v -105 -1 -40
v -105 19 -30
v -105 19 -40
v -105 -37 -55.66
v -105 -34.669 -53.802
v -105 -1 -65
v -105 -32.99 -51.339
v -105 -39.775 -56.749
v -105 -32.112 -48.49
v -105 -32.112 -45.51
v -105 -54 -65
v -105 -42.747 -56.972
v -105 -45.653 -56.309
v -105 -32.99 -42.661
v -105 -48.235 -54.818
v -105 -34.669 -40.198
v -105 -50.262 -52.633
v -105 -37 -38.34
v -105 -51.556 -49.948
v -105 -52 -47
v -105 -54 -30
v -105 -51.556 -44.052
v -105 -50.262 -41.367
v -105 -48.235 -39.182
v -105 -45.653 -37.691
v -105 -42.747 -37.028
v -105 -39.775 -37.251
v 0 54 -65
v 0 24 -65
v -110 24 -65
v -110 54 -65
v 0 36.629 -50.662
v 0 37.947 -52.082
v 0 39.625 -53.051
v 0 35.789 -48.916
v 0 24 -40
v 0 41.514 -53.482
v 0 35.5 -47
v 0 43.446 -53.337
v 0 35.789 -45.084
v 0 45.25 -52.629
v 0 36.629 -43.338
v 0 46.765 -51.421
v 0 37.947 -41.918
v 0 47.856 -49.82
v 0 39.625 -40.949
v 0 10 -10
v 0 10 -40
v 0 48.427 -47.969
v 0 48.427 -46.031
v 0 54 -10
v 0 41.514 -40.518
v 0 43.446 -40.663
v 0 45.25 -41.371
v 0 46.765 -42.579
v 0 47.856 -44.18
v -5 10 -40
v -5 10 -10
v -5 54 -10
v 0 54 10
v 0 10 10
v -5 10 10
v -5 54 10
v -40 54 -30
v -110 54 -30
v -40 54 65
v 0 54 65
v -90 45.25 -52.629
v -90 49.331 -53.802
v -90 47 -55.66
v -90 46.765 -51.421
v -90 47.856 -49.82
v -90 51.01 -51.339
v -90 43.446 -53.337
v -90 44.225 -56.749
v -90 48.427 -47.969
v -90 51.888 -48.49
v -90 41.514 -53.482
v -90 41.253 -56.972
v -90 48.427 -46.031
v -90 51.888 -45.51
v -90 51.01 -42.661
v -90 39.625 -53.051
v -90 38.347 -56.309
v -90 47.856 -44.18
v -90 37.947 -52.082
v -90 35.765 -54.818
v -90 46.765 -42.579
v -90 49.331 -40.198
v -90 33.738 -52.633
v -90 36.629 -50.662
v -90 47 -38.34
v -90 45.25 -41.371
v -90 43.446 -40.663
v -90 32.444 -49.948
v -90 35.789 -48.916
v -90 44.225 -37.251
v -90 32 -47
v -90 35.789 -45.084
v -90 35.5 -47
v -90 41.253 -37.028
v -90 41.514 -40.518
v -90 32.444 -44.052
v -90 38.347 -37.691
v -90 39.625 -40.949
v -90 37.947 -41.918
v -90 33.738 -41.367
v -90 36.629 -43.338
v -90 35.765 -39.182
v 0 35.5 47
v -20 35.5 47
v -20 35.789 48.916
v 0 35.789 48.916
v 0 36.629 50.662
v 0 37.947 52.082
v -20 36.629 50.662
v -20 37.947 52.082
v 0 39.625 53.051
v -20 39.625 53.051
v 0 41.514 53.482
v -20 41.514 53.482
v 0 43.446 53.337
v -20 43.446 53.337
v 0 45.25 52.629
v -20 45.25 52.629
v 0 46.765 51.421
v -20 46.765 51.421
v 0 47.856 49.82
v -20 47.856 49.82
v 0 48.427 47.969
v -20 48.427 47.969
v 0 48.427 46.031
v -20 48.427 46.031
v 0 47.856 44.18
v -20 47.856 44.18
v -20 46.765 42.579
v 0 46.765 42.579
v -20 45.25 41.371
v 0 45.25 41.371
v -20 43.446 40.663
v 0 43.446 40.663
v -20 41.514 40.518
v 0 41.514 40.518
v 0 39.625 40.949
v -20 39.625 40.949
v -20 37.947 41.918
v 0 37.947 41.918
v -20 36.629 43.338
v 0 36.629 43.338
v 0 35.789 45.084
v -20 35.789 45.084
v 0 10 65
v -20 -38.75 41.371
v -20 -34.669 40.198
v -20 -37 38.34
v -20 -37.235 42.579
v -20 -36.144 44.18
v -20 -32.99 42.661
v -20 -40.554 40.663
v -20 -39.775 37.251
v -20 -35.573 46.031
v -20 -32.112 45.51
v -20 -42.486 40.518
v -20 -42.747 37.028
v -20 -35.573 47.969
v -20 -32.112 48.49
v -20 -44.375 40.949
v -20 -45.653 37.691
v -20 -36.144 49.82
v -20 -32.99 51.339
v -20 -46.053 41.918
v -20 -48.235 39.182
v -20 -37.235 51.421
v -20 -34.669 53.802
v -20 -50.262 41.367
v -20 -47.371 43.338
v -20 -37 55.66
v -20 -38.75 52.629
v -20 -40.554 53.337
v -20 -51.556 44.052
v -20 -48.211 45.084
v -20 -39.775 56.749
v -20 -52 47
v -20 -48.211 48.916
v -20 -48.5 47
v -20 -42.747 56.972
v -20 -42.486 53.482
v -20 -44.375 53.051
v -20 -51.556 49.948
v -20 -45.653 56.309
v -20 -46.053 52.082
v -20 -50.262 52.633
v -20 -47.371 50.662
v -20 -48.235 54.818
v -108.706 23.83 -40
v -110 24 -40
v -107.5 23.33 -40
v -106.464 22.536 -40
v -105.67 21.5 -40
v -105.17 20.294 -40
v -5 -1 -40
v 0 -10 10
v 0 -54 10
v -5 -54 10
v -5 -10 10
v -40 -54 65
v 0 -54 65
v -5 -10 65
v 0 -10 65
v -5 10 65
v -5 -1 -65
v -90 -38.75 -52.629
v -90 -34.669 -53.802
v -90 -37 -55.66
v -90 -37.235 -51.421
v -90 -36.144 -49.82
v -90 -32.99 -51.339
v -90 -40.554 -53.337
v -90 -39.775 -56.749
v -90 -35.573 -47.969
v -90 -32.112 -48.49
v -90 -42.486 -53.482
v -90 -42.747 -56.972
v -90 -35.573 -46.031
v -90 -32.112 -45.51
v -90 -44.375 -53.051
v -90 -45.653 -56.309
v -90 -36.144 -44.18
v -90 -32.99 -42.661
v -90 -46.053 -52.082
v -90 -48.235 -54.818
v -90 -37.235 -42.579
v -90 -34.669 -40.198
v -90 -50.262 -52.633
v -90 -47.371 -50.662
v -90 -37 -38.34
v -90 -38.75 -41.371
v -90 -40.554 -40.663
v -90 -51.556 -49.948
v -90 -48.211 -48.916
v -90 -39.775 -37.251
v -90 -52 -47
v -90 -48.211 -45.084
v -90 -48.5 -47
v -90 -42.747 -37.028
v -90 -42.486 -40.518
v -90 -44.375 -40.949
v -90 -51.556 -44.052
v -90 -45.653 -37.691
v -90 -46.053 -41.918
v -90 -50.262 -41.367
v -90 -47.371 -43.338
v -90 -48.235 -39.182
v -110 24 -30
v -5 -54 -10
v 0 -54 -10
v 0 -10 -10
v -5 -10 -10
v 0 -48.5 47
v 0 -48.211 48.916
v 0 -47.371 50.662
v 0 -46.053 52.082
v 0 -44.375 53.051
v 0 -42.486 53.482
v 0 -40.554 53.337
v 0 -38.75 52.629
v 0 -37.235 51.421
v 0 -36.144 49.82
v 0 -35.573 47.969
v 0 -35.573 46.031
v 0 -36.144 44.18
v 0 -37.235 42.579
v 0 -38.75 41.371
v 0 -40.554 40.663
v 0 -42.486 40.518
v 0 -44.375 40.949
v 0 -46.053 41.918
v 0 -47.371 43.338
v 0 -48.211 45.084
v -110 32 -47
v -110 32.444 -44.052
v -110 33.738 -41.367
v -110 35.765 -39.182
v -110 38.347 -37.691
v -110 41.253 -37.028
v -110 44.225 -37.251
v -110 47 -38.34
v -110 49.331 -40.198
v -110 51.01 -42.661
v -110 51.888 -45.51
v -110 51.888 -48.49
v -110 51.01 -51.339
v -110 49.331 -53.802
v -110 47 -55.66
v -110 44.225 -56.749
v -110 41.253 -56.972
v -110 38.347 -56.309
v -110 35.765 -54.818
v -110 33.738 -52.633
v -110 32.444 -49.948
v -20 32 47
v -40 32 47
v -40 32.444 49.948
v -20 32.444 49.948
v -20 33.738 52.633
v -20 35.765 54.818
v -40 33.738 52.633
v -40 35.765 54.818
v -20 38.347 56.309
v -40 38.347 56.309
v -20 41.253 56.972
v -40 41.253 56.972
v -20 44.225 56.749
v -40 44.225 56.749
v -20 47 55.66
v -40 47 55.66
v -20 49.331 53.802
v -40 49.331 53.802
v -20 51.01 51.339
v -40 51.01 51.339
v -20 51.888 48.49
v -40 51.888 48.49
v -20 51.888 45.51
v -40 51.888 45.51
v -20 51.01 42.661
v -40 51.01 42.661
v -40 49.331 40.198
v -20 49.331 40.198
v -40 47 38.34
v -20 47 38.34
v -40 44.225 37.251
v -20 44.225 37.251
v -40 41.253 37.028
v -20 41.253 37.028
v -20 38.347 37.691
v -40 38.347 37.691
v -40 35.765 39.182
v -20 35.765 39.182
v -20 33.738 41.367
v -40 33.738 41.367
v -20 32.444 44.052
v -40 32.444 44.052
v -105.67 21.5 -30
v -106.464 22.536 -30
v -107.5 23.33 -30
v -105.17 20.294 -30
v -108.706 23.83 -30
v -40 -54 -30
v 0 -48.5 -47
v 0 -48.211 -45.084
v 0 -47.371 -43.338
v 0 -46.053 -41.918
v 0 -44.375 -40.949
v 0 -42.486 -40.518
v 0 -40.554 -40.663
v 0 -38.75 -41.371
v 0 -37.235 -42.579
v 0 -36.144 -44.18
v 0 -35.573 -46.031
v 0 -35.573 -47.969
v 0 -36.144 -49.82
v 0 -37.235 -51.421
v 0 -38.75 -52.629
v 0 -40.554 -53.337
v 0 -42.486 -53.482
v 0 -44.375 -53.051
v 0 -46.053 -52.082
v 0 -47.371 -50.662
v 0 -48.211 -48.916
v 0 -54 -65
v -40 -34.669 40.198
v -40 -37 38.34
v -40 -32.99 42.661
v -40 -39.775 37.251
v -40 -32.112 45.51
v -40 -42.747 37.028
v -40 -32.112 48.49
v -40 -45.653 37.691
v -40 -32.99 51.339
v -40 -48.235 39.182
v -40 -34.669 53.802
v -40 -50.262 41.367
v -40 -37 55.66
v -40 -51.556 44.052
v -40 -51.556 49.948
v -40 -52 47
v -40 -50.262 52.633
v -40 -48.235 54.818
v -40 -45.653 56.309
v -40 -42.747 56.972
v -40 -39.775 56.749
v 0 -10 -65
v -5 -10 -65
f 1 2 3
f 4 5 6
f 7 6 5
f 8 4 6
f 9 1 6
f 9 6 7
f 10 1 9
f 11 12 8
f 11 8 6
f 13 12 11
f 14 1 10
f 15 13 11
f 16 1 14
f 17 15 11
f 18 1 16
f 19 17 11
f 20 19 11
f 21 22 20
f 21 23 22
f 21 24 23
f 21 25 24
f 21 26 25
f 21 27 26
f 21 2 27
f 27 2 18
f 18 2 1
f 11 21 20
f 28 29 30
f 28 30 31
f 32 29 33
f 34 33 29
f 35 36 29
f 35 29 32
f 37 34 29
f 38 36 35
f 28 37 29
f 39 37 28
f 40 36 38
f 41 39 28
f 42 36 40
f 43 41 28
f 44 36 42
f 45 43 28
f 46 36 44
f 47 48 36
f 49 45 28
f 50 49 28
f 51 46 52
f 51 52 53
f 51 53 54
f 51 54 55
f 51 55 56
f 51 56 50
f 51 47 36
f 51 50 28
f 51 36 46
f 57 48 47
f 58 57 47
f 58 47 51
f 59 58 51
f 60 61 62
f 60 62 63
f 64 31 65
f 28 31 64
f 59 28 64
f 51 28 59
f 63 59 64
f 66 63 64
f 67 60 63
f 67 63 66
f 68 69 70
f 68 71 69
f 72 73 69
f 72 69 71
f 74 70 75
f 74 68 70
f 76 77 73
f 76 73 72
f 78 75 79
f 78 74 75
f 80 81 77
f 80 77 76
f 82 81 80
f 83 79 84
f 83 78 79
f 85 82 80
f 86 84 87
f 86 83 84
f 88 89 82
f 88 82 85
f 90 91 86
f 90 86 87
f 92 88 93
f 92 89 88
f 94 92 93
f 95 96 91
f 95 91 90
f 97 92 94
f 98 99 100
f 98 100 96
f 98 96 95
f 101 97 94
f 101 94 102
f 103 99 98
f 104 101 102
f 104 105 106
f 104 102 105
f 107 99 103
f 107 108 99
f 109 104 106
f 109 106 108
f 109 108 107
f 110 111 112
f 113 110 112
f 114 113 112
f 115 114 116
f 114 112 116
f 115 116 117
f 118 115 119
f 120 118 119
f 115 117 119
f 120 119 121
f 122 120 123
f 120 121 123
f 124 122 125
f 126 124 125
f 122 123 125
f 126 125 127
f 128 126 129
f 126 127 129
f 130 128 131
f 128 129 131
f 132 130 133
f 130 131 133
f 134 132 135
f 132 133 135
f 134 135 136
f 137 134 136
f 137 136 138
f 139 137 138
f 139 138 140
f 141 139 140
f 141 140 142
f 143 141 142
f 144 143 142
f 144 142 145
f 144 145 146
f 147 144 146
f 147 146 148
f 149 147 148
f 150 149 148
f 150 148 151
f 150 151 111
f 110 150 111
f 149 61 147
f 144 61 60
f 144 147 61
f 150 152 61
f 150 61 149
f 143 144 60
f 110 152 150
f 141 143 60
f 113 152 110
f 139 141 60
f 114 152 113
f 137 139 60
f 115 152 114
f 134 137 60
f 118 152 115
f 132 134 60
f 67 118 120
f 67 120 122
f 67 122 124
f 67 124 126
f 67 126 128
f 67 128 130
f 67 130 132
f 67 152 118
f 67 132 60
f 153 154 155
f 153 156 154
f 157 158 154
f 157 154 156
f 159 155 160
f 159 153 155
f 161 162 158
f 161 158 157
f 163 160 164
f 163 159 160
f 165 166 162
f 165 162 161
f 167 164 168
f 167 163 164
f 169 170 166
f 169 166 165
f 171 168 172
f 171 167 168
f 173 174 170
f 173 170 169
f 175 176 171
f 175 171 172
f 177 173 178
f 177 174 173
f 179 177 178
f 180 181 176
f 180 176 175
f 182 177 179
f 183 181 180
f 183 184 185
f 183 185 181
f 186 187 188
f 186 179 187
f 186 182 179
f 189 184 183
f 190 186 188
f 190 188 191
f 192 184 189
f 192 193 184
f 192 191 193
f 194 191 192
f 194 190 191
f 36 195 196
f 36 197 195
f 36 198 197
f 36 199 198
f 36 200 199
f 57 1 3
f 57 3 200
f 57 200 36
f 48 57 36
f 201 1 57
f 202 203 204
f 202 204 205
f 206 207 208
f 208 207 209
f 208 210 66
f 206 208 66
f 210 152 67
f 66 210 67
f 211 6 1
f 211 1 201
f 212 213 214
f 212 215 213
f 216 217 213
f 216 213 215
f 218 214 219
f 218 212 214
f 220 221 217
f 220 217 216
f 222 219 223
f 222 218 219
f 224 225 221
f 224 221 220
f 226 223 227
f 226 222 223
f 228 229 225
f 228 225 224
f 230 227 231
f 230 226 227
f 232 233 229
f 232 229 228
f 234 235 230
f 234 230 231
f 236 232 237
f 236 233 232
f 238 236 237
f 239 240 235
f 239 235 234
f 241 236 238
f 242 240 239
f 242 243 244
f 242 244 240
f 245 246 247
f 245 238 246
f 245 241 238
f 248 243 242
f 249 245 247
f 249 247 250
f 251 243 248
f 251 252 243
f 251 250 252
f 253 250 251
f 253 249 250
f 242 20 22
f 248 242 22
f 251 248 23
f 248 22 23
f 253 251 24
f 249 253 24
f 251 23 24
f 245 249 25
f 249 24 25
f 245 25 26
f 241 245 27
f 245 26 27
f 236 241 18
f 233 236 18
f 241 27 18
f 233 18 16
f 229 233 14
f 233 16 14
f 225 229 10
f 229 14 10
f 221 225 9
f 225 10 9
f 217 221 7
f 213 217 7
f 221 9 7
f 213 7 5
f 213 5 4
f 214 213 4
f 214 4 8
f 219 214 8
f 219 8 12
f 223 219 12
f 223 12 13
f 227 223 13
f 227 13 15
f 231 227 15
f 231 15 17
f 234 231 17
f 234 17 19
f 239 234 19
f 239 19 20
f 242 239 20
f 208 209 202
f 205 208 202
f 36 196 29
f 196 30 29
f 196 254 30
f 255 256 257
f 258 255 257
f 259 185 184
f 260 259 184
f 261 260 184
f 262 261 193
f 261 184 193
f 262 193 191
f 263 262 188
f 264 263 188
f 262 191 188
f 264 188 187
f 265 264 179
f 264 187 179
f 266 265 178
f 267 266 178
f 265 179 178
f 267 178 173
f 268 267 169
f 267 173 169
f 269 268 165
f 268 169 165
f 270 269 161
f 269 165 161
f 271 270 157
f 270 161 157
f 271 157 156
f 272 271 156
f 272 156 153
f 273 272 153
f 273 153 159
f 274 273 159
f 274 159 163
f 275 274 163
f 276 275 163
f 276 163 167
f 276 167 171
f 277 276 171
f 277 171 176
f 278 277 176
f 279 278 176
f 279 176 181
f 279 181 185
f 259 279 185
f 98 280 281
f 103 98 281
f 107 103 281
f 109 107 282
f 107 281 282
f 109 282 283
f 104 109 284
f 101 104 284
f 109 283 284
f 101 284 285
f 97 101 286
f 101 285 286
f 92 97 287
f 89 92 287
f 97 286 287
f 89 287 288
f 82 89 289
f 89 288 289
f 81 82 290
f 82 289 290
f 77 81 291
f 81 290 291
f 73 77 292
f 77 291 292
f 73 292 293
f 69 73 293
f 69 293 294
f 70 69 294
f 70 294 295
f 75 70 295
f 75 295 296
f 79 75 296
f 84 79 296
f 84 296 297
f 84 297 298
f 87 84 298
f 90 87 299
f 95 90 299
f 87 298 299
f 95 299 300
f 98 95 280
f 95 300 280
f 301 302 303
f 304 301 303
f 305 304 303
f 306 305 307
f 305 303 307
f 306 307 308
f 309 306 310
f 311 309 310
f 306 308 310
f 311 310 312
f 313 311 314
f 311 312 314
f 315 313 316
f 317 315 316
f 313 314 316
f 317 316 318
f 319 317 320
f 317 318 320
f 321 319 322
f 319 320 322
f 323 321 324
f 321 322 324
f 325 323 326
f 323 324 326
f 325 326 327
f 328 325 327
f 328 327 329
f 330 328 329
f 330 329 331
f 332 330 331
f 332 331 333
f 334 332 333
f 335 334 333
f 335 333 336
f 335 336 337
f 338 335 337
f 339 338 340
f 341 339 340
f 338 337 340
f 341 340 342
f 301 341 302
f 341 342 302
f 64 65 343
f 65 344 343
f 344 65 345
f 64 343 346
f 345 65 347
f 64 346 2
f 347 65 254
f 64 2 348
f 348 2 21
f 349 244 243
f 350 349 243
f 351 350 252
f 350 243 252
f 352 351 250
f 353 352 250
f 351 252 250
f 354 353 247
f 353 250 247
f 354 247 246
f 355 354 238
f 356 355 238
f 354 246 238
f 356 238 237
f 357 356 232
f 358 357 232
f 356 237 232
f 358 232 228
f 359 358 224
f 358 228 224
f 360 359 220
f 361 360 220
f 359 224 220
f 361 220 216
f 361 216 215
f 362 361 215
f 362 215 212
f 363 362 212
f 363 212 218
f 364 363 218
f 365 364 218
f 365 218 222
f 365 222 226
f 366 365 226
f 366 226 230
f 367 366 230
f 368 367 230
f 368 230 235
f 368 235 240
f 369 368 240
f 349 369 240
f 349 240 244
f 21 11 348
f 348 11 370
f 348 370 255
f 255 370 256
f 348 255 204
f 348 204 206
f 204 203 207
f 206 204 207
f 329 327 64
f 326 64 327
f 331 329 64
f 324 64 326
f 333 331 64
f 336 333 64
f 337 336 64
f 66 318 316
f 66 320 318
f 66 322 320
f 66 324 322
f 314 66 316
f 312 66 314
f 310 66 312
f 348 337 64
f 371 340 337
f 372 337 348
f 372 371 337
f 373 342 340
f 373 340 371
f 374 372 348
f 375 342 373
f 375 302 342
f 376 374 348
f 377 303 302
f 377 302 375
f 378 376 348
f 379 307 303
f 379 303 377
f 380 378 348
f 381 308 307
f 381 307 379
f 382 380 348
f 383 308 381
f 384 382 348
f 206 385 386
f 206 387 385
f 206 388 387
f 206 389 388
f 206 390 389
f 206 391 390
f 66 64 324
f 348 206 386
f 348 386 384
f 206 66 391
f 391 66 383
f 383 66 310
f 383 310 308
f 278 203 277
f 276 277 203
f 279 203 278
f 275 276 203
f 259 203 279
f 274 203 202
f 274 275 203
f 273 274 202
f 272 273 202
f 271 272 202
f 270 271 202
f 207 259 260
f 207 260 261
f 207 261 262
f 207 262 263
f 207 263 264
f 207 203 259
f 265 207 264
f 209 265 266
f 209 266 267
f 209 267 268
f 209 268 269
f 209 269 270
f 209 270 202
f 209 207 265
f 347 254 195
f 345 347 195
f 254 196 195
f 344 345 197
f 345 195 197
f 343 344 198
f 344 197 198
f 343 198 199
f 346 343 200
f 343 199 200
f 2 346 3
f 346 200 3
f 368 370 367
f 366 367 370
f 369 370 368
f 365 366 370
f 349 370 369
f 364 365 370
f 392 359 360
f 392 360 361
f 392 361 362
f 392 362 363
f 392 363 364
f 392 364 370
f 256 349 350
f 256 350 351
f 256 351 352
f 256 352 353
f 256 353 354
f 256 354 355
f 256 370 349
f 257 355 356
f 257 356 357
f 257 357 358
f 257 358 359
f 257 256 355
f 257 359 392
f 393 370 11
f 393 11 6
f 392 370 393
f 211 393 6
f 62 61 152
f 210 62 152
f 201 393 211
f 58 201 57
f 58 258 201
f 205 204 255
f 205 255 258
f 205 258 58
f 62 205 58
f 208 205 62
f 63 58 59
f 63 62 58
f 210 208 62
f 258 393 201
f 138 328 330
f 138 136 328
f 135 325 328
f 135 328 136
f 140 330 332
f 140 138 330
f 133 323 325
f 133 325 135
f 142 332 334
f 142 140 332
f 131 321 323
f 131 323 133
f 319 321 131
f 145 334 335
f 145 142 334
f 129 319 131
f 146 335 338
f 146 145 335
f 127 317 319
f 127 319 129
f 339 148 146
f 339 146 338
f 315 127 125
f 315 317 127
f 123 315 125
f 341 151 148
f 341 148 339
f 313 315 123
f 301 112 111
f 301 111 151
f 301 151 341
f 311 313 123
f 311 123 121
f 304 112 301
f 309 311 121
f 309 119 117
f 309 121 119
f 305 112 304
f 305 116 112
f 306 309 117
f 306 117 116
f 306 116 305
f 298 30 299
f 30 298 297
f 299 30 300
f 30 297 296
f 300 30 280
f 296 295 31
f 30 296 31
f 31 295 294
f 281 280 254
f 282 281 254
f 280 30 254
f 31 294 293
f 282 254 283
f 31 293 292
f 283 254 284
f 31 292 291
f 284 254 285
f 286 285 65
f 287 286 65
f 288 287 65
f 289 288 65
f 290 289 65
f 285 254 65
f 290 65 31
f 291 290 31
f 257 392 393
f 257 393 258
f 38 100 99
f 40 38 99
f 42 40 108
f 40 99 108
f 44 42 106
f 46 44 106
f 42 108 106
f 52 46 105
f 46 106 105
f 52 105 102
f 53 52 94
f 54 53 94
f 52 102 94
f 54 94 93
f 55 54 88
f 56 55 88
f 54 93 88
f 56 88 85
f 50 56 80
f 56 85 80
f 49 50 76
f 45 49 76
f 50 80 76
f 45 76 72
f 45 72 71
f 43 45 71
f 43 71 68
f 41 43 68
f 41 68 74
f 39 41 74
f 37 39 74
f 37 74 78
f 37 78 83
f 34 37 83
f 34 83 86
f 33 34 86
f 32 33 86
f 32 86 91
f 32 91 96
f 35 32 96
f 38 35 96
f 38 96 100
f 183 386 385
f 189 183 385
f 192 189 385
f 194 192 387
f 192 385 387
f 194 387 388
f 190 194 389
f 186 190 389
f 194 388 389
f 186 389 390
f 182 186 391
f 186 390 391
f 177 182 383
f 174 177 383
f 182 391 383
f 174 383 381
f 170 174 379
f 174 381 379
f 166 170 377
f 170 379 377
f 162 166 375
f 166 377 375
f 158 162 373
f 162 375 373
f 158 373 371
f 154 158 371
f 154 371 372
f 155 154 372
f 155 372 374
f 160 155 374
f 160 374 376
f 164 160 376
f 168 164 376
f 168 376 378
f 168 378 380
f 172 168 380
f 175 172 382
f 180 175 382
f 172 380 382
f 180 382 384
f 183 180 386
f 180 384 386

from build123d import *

# Parameters (mm, degrees)
F0_W      = 108
F0_H      = 130
F1_DEPTH  = 110
F2_R      = 6.5
F3_DEPTH  = 110.001
F4_W      = 108
F4_H      = 95
F5_DEPTH  = 70
F6_W      = 110
F6_H      = 25
F7_DEPTH  = 25
F8_R      = 6.5
F9_DEPTH  = 5
F10_R     = 4.99999
F11_R     = 10
F12_DEPTH = 20
F13_R     = 10
F14_DEPTH = 20
F15_W     = 20
F15_H     = 55
F15_W_2   = 44
F15_H_2   = 20
F16_DEPTH = 5


# Not quite as in the source:
# - a fillet or chamfer is up to 0.001 mm smaller than in the source, because OpenCascade refuses the exact size


with BuildPart() as f1:
    # F0 (on Right) → F1 (new body)
    with BuildSketch(Plane.YZ):
        Rectangle(F0_W, F0_H)
    extrude(amount=-F1_DEPTH)

    # F2 (on face) → F3 (cut, through all)
    with BuildSketch(Plane(origin=(-110, 0, 0), x_dir=(0, -1, 0), z_dir=(-1, 0, 0))):
        with Locations((-42, 47)):
            Circle(F2_R)
        with Locations((42, 47)):
            Circle(F2_R)
        with Locations((-42, -47)):
            Circle(F2_R)
        with Locations((42, -47)):
            Circle(F2_R)
    extrude(amount=-F3_DEPTH, mode=Mode.SUBTRACT)

    # F4 (on face) → F5 (cut)
    with BuildSketch(Plane(origin=(-110, 0, 0), x_dir=(0, -1, 0), z_dir=(-1, 0, 0))):
        with Locations((0, 17.5)):
            Rectangle(F4_W, F4_H)
    extrude(amount=-F5_DEPTH, mode=Mode.SUBTRACT)

    # F6 (on face) → F7 (cut)
    with BuildSketch(Plane(origin=(0, 0, -65), x_dir=(1, 0, 0), z_dir=(0, 0, -1))):
        with Locations((-55, -11.5)):
            Rectangle(F6_W, F6_H)
    extrude(amount=-F7_DEPTH, mode=Mode.SUBTRACT)

    # F8 (on face) → F9 (cut)
    with BuildSketch(Plane(origin=(-110, 0, 0), x_dir=(0, -1, 0), z_dir=(-1, 0, 0))):
        Polygon((-24, -30), (-24, -40), (1, -40), (1, -65), (54, -65), (54, -30), align=None)
        with Locations((42, -47)):
            Circle(F8_R, mode=Mode.SUBTRACT)
    extrude(amount=-F9_DEPTH, mode=Mode.SUBTRACT)

    # F10 (radius 5 in the source; OpenCascade refuses exactly that, so slightly less here)
    f10_edges = [f1.edges().sort_by_distance(p)[0] for p in [
        (-105, 24, -35),
    ]]
    fillet(f10_edges, radius=F10_R)

    # F11 (on face) → F12 (cut)
    with BuildSketch(Plane(origin=(-40, 0, 0), x_dir=(0, -1, 0), z_dir=(-1, 0, 0))):
        with Locations((-42, 47)):
            Circle(F11_R)
        with Locations((42, 47)):
            Circle(F11_R)
    extrude(amount=-F12_DEPTH, mode=Mode.SUBTRACT)

    # F13 (on face) → F14 (cut)
    with BuildSketch(Plane(origin=(-110, 0, 0), x_dir=(0, -1, 0), z_dir=(-1, 0, 0))):
        with Locations((-42, -47)):
            Circle(F13_R)
        with Locations((42, -47)):
            Circle(F13_R)
    extrude(amount=-F14_DEPTH, mode=Mode.SUBTRACT)

    # F15 (on face) → F16 (cut)
    with BuildSketch(Plane.YZ):
        with Locations((0, 37.5)):
            Rectangle(F15_W, F15_H)
        with Locations((32, 0)):
            Rectangle(F15_W_2, F15_H_2)
        Rectangle(F15_W, F15_H_2)
        with Locations((-32, 0)):
            Rectangle(F15_W_2, F15_H_2)
        with Locations((0, -37.5)):
            Rectangle(F15_W, F15_H)
    extrude(amount=-F16_DEPTH, mode=Mode.SUBTRACT)


solid = f1.part
